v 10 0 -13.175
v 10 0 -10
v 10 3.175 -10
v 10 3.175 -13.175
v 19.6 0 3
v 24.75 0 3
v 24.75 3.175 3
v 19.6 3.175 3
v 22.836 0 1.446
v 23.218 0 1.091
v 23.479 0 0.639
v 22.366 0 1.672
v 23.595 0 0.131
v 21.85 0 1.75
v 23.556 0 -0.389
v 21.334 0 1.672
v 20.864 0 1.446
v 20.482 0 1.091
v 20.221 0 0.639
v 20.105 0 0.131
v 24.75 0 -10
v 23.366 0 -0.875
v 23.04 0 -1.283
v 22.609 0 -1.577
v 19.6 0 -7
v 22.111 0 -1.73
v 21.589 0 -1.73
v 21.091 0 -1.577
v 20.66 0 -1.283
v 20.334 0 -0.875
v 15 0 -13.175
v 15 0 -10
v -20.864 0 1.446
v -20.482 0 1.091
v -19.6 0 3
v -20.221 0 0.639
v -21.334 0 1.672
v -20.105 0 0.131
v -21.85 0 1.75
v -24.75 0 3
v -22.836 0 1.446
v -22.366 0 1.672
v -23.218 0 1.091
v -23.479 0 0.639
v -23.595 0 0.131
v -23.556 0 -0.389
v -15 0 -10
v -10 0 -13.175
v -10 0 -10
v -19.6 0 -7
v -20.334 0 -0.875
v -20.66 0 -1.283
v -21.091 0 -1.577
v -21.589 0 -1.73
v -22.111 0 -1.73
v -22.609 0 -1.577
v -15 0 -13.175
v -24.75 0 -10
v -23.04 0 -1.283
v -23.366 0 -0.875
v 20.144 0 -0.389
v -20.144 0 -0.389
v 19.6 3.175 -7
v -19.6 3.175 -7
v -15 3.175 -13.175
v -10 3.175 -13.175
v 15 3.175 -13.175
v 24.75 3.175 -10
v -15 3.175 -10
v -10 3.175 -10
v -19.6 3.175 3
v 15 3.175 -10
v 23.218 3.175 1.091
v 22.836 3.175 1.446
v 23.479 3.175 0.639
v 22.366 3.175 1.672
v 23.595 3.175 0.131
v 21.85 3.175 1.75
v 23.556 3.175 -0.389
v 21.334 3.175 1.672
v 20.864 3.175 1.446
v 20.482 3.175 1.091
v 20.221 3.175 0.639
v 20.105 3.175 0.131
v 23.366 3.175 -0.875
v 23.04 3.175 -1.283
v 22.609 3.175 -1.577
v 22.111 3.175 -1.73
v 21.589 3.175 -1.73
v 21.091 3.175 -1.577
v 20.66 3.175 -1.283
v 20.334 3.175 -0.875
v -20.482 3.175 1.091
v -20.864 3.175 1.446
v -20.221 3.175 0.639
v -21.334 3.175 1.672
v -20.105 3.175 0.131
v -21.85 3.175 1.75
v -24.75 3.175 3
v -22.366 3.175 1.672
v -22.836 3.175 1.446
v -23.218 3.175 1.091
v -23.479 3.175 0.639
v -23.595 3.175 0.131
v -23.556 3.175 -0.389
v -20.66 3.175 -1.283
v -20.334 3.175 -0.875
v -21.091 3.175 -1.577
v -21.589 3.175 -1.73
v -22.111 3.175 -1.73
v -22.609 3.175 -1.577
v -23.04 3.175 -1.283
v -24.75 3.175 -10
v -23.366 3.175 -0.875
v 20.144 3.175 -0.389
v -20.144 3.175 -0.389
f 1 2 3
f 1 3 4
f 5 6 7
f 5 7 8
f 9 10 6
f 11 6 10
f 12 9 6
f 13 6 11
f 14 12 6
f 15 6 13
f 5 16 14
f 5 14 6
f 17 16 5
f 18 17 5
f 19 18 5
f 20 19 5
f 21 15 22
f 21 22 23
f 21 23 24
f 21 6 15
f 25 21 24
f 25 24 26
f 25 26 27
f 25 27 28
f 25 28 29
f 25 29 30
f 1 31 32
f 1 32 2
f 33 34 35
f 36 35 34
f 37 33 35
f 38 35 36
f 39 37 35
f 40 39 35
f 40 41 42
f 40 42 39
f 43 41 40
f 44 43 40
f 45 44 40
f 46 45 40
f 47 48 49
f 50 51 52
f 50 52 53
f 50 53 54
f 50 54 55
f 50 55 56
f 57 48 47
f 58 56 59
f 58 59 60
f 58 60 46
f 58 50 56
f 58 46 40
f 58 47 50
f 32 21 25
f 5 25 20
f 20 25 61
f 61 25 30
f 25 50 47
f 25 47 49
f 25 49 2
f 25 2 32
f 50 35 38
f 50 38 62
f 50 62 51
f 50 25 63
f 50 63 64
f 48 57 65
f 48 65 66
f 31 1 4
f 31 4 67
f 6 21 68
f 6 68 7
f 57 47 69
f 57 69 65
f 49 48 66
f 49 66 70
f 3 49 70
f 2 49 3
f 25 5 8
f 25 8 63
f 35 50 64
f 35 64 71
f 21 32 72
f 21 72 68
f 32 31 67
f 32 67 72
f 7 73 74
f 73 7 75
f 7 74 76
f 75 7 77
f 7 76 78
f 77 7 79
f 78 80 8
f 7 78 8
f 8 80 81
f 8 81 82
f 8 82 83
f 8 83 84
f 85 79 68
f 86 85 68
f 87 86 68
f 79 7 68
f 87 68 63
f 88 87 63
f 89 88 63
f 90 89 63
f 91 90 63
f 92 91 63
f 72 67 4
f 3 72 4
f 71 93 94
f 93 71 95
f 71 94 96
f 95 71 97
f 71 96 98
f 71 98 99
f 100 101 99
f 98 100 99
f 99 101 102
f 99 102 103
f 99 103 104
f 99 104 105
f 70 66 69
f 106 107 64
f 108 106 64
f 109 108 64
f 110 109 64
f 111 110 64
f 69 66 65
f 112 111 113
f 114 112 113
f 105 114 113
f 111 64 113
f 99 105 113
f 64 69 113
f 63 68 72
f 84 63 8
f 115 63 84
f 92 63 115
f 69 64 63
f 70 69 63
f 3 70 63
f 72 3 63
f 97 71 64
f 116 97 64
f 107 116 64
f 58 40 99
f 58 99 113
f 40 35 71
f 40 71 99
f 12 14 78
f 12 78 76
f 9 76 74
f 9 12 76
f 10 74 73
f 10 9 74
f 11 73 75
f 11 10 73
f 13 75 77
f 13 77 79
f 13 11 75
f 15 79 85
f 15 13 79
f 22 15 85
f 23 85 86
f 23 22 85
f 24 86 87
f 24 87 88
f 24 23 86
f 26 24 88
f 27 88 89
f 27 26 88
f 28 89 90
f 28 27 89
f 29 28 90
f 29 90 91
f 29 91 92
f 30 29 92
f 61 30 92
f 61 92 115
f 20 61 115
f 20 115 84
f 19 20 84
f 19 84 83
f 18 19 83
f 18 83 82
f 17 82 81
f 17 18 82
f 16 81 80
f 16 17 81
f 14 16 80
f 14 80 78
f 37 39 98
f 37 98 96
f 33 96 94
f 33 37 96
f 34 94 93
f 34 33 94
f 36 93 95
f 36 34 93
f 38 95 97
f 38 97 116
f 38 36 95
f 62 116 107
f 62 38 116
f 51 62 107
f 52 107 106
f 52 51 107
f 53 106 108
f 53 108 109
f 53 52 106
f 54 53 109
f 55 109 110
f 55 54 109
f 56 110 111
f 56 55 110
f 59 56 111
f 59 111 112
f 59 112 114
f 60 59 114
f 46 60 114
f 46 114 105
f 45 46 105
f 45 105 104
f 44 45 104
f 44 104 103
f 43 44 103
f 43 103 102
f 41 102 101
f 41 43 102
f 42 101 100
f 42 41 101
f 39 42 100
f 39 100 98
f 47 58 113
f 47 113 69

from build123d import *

# Parameters (mm, degrees)
SKETCH1_R           = 1.75
BOSS_EXTRUDE1_DEPTH = 3.175


with BuildPart() as part:
    # Sketch1 → Boss-Extrude1 (new body)
    with BuildSketch(Plane(origin=(0, 0, 0), x_dir=(1, 0, 0), z_dir=(0, 1, 0))):
        Polygon((-24.75, -3), (-24.75, 10), (-15, 10), (-15, 13.175), (-10, 13.175), (-10, 10), (10, 10), (10, 13.175), (15, 13.175), (15, 10), (24.75, 10), (24.75, -3), (19.6, -3), (19.6, 7), (-19.6, 7), (-19.6, -3), align=None)
        with Locations(Location((-21.85, 0, 0), (0, 0, 270))):
            Circle(SKETCH1_R, mode=Mode.SUBTRACT)
        with Locations(Location((21.85, 0, 0), (0, 0, 270))):
            Circle(SKETCH1_R, mode=Mode.SUBTRACT)
    extrude(amount=BOSS_EXTRUDE1_DEPTH)


solid = part.part
